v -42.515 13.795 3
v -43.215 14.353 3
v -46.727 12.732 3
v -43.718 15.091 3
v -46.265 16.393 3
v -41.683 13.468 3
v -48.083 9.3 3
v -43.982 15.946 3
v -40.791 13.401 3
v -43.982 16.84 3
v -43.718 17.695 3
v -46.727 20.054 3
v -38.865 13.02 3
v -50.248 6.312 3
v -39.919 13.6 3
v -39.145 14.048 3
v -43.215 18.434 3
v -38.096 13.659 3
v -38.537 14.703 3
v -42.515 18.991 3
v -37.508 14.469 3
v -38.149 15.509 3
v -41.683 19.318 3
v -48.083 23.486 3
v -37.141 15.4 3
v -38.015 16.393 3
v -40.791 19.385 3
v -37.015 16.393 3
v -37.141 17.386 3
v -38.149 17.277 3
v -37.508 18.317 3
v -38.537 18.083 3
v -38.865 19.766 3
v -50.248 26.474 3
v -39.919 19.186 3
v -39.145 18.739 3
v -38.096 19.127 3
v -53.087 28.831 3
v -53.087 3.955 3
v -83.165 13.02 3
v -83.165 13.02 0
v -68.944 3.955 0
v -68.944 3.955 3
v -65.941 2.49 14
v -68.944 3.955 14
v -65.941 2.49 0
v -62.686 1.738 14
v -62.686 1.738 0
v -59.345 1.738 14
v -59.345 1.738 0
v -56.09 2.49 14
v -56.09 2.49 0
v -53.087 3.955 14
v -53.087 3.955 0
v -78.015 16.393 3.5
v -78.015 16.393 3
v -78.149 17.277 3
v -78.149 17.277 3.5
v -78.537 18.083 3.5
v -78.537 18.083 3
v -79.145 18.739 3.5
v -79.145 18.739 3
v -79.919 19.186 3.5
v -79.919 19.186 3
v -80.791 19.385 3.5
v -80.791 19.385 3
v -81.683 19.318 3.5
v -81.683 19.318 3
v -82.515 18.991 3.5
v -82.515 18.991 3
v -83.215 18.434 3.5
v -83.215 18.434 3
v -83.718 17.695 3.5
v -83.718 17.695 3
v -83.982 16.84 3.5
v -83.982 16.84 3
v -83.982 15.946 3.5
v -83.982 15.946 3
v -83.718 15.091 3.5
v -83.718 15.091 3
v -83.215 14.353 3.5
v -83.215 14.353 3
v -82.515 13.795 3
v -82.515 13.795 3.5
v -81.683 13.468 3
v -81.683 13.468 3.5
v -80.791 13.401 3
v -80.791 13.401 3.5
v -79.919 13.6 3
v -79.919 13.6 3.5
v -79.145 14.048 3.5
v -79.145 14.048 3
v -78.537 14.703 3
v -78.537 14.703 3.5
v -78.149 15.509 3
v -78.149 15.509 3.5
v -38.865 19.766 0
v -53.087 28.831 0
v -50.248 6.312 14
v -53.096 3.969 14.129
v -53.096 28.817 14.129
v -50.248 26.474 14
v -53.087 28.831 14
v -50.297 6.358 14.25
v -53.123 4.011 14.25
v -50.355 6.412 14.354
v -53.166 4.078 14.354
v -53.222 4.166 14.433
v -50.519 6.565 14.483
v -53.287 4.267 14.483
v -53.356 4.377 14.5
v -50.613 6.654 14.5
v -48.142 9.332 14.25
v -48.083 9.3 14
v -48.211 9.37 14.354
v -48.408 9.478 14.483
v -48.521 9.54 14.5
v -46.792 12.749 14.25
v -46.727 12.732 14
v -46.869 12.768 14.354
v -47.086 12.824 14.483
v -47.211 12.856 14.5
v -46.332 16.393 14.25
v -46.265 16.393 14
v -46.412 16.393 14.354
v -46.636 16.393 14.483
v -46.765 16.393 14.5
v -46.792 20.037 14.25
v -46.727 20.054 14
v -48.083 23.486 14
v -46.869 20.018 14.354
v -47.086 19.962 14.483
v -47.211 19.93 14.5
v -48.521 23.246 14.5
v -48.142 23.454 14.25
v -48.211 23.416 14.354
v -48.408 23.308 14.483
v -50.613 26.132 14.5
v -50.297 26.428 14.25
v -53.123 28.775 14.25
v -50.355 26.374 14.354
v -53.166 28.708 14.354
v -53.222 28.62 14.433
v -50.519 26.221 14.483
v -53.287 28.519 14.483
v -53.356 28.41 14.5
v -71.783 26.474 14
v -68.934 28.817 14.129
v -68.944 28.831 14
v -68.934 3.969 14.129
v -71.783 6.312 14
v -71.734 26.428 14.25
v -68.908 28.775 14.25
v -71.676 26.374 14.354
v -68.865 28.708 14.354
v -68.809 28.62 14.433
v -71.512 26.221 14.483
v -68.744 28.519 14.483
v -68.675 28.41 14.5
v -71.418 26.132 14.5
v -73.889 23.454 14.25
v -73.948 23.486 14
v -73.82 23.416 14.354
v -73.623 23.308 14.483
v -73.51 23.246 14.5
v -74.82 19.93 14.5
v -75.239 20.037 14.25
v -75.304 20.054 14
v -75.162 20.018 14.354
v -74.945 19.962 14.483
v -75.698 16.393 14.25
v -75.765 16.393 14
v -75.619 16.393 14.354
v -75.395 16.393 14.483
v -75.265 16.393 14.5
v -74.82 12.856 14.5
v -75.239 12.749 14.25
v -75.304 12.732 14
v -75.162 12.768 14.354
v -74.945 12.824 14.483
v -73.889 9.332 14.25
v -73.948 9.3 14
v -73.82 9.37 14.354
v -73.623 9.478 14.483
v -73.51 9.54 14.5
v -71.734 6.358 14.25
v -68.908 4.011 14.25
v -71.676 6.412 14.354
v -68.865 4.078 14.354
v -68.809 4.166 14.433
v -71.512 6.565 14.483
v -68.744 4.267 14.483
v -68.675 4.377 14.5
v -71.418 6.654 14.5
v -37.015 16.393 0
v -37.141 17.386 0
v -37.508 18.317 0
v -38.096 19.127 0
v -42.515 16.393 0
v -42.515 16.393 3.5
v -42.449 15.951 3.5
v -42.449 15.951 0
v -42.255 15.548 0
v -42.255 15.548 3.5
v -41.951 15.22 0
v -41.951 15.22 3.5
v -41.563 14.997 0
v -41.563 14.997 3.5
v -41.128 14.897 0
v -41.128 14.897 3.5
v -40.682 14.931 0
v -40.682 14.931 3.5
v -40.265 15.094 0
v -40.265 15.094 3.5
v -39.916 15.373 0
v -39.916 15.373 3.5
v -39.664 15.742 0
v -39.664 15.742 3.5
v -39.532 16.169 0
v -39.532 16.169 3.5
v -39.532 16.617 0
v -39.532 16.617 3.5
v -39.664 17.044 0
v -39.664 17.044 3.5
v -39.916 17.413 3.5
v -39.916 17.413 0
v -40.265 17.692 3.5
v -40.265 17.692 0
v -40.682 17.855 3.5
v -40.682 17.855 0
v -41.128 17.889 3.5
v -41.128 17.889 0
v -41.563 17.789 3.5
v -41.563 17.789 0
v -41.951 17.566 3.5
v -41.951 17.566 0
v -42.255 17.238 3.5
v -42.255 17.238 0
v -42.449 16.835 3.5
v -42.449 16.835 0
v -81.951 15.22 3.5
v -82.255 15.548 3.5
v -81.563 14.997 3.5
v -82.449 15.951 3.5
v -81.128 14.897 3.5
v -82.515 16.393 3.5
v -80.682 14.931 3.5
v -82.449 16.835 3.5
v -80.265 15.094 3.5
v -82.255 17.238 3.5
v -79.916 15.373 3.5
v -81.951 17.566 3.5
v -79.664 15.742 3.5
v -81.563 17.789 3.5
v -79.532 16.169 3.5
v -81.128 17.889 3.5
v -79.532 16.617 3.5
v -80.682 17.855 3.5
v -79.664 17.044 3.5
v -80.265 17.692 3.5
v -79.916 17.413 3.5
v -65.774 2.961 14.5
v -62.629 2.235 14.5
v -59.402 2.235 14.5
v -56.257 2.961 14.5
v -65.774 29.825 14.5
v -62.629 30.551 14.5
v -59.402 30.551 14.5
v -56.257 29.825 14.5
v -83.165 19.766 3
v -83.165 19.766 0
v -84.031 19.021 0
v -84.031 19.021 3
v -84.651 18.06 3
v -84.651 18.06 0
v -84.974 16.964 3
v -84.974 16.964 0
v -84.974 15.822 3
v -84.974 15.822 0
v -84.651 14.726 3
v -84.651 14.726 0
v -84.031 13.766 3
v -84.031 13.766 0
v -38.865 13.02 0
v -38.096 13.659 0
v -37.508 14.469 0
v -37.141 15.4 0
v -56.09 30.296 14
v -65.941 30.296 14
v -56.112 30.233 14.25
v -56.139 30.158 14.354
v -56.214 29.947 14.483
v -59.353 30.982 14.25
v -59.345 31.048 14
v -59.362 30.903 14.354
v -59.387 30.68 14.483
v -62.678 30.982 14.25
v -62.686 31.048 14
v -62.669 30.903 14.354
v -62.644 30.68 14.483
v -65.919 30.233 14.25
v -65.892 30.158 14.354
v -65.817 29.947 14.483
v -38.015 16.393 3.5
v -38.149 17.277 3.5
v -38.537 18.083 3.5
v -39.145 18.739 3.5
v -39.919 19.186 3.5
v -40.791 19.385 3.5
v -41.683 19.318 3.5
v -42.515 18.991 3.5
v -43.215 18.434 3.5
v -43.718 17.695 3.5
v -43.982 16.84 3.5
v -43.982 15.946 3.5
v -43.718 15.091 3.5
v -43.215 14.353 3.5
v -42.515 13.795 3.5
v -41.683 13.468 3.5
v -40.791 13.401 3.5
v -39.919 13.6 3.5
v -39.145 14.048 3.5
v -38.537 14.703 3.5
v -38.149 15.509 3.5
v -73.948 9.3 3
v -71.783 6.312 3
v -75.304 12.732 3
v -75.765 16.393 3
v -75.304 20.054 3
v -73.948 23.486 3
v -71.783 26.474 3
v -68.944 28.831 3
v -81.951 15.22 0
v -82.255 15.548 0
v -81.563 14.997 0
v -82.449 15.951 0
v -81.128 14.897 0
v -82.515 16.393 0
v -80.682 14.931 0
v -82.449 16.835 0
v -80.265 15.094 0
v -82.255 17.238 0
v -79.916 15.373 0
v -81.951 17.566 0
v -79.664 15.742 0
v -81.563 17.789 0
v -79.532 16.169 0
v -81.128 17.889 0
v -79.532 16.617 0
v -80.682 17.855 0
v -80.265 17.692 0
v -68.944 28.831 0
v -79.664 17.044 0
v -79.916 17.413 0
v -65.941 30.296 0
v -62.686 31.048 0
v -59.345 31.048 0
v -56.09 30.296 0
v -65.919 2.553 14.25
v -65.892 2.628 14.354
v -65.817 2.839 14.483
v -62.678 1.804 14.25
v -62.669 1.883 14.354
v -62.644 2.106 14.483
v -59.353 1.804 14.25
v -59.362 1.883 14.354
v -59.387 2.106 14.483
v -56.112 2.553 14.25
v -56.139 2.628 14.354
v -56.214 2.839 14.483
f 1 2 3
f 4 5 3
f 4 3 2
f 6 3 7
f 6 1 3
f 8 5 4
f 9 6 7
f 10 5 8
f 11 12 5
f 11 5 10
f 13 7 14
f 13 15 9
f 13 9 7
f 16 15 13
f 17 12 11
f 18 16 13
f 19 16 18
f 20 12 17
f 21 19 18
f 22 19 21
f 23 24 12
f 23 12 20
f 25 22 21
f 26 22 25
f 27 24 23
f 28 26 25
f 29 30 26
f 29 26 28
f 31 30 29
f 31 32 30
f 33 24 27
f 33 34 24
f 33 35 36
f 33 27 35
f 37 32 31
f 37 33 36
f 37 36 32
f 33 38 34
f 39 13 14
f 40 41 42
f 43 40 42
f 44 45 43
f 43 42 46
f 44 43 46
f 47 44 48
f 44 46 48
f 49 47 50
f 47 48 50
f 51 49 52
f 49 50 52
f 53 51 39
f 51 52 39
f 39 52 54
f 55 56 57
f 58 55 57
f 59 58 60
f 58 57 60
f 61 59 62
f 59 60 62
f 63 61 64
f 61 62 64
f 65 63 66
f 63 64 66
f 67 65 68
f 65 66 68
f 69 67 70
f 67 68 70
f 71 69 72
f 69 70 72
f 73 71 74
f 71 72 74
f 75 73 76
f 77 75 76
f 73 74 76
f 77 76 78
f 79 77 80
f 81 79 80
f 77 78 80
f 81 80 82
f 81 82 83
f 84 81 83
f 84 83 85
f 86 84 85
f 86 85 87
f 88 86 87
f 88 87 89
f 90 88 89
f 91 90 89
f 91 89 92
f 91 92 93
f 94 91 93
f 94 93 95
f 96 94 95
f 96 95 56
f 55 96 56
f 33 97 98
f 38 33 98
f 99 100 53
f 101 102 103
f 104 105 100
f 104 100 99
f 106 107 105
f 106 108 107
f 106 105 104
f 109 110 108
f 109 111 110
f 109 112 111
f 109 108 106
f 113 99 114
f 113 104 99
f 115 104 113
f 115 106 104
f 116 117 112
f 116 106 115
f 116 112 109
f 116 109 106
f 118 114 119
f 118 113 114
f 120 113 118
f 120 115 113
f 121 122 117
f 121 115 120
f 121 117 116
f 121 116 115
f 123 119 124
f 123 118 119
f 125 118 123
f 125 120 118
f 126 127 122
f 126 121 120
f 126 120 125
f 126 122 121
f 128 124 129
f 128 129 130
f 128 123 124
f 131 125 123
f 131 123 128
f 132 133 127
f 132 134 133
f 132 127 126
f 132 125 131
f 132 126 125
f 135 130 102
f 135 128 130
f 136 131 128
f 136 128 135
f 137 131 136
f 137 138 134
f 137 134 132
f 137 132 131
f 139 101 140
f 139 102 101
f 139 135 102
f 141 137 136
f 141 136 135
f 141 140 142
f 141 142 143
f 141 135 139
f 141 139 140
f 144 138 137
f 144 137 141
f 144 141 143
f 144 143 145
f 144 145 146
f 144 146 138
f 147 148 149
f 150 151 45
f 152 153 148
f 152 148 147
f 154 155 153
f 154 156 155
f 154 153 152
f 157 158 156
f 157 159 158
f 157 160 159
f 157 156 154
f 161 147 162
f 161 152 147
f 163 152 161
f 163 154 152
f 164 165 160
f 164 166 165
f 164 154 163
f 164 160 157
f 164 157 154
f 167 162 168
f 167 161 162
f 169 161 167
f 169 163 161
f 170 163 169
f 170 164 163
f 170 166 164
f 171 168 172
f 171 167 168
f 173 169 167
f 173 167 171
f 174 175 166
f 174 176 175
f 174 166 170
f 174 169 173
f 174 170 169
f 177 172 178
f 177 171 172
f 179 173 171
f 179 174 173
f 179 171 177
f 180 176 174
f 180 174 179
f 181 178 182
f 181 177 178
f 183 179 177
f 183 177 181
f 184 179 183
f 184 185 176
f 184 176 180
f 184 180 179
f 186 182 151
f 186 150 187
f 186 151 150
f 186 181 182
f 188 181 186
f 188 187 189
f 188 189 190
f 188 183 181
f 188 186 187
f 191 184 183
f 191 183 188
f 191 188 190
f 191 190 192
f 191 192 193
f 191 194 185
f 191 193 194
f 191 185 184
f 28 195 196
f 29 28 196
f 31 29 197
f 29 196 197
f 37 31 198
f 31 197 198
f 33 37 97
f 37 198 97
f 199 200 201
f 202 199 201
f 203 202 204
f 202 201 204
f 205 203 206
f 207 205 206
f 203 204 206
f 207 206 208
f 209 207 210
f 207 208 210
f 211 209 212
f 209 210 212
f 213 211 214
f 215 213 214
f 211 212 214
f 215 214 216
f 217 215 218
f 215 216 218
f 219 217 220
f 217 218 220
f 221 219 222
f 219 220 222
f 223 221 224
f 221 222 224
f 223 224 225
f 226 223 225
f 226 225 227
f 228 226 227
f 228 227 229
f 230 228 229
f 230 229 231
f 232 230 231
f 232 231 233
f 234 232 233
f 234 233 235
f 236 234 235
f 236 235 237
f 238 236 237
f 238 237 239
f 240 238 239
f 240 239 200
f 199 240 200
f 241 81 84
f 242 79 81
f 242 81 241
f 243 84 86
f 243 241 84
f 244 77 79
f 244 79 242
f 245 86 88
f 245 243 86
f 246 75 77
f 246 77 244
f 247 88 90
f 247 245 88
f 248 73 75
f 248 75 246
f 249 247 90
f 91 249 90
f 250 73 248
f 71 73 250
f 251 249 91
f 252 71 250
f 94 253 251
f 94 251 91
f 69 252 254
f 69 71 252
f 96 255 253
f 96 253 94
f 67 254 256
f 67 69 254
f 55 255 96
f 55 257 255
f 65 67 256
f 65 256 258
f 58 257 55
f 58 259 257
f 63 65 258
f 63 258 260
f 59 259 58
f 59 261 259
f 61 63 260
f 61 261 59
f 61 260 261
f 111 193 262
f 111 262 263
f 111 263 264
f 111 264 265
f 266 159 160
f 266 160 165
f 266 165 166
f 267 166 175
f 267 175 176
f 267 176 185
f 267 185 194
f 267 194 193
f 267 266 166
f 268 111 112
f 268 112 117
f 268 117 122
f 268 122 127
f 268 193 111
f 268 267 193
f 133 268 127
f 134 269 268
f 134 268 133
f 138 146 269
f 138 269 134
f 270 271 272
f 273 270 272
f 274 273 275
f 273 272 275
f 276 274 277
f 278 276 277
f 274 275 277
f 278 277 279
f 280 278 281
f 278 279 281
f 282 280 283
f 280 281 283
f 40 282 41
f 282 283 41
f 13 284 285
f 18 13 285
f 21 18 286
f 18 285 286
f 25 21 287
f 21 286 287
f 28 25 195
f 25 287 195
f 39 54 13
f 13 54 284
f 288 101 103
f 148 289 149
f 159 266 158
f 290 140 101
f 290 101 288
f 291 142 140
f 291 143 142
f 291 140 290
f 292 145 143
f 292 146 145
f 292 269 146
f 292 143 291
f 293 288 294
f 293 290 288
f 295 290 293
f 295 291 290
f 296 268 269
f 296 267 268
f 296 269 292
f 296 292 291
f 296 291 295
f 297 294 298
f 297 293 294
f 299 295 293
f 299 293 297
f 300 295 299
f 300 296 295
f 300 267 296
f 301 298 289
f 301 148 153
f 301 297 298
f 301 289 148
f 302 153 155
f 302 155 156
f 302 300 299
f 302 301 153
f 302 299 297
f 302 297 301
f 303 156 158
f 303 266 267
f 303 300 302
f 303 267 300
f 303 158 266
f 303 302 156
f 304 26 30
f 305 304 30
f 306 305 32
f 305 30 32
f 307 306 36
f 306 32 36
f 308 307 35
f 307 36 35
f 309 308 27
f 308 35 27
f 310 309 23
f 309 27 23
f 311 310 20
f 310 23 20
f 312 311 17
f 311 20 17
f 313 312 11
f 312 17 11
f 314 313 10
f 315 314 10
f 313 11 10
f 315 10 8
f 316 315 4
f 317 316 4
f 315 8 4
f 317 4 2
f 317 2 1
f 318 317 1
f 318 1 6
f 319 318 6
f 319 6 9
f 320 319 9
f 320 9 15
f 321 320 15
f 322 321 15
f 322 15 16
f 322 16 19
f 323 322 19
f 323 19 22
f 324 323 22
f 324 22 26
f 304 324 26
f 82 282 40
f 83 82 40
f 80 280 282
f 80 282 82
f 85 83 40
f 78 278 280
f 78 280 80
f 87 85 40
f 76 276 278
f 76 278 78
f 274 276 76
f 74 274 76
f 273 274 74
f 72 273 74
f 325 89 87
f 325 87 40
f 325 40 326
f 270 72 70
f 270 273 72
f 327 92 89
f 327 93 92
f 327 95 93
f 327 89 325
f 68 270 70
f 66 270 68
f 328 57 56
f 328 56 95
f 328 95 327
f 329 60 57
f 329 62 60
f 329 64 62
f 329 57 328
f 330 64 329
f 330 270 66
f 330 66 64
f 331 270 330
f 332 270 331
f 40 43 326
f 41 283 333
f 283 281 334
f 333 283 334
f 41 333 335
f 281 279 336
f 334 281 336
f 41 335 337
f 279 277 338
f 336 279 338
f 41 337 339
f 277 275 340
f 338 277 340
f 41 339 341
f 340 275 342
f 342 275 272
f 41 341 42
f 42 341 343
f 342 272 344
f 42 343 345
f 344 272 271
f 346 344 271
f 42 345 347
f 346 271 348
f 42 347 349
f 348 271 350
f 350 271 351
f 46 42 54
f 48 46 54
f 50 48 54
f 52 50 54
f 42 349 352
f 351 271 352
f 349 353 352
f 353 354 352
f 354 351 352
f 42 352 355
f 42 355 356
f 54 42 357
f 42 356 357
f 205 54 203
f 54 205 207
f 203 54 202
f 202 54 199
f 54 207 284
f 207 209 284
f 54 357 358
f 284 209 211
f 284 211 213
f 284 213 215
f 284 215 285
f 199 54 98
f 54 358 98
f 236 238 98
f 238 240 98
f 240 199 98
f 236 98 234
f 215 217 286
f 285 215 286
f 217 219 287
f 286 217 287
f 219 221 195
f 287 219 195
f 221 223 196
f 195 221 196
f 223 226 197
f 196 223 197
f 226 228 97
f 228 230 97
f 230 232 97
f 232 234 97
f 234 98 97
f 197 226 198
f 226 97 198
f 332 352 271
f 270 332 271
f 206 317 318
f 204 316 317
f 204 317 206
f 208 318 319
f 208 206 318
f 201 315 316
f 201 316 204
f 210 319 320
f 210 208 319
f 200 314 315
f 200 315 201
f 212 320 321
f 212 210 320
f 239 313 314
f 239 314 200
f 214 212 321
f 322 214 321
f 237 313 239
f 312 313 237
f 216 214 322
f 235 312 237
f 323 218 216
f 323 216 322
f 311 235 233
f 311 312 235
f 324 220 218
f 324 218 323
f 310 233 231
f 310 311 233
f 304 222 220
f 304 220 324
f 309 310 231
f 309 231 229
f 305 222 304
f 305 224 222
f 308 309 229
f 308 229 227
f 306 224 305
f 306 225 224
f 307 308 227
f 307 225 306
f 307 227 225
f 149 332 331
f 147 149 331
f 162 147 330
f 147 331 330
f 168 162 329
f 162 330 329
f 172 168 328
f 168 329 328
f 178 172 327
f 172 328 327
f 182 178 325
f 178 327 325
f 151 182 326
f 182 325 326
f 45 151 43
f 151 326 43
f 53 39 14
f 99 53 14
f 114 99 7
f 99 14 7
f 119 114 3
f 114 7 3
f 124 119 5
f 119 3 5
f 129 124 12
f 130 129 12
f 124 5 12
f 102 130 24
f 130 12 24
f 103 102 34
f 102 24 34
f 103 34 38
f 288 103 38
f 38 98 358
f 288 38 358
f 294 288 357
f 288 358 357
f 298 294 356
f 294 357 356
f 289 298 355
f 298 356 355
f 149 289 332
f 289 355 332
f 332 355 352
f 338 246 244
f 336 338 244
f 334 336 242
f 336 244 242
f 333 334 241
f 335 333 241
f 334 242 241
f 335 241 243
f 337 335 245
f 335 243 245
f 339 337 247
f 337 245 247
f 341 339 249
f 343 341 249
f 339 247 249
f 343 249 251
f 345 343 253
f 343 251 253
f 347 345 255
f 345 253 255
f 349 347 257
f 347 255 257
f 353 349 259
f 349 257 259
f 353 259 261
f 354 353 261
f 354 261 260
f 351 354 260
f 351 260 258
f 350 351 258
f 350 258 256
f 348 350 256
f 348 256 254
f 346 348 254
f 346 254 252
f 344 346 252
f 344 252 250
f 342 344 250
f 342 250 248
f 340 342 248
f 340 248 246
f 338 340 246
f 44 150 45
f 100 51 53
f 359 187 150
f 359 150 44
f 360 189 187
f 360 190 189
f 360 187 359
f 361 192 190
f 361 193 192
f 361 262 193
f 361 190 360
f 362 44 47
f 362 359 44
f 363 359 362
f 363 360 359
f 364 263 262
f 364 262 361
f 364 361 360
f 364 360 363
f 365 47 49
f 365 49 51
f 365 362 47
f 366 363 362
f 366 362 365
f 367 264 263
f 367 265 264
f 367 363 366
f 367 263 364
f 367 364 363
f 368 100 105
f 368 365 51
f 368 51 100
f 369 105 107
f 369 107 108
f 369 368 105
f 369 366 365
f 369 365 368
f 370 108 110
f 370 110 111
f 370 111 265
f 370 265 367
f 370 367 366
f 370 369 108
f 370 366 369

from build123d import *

# Parameters (mm, degrees)
F0_R     = 3
F1_DEPTH = 3
F3_DEPTH = 11.5
F4_R     = 0.5
F6_DEPTH = 3.5
F7_D     = 3


with BuildPart() as f1:
    # F0 (on Top) → F1 (new body)
    with BuildSketch(Plane.XY):
        with BuildLine():
            ThreePointArc((-53.0873338103, 3.9548860426), (-48.0828963467, 9.2999784643), (-46.2654588103, 16.393026337))
            ThreePointArc((-46.2654588103, 16.393026337), (-48.0828963467, 23.4860742098), (-53.0873338103, 28.8311666315))
            ThreePointArc((-53.0873338103, 28.8311666315), (-61.0154588103, 31.143026337), (-68.9435838103, 28.8311666315))
            ThreePointArc((-68.9435838103, 28.8311666315), (-75.7654588103, 16.393026337), (-68.9435838103, 3.9548860426))
            ThreePointArc((-68.9435838103, 3.9548860426), (-61.0154588103, 1.643026337), (-53.0873338103, 3.9548860426))
        make_face()
        with BuildLine():
            ThreePointArc((-68.9435838103, 3.9548860426), (-75.7654588103, 16.393026337), (-68.9435838103, 28.8311666315))
            Line((-68.9435838103, 28.8311666315), (-83.1654588103, 19.7660813321))
            ThreePointArc((-83.1654588103, 19.7660813321), (-79.0919204042, 19.9001619204), (-77.0154588103, 16.393026337))
            ThreePointArc((-77.0154588103, 16.393026337), (-79.0919204042, 12.8858907537), (-83.1654588103, 13.0199713419))
            Line((-83.1654588103, 13.0199713419), (-68.9435838103, 3.9548860426))
        make_face()
        with BuildLine():
            ThreePointArc((-53.0873338103, 28.8311666315), (-48.0828963467, 23.4860742098), (-46.2654588103, 16.393026337))
            ThreePointArc((-46.2654588103, 16.393026337), (-48.0828963467, 9.2999784643), (-53.0873338103, 3.9548860426))
            Line((-53.0873338103, 3.9548860426), (-38.8654588103, 13.0199713419))
            ThreePointArc((-38.8654588103, 13.0199713419), (-45.0154588103, 16.393026337), (-38.8654588103, 19.7660813321))
            Line((-38.8654588103, 19.7660813321), (-53.0873338103, 28.8311666315))
        make_face()
        with BuildLine():
            ThreePointArc((-37.0154588103, 16.393026337), (-37.508323227, 18.3165647432), (-38.8654588103, 19.7660813321))
            ThreePointArc((-38.8654588103, 19.7660813321), (-45.0154588103, 16.393026337), (-38.8654588103, 13.0199713419))
            ThreePointArc((-38.8654588103, 13.0199713419), (-37.508323227, 14.4694879309), (-37.0154588103, 16.393026337))
        make_face()
        with Locations((-41.0154588103, 16.393026337)):
            Circle(F0_R, mode=Mode.SUBTRACT)
        with BuildLine():
            ThreePointArc((-77.0154588103, 16.393026337), (-79.0919204042, 19.9001619204), (-83.1654588103, 19.7660813321))
            ThreePointArc((-83.1654588103, 19.7660813321), (-85.0154588103, 16.393026337), (-83.1654588103, 13.0199713419))
            ThreePointArc((-83.1654588103, 13.0199713419), (-79.0919204042, 12.8858907537), (-77.0154588103, 16.393026337))
        make_face()
        with Locations((-81.0154588103, 16.393026337)):
            Circle(F0_R, mode=Mode.SUBTRACT)
    extrude(amount=F1_DEPTH)

    # F2 (on face) → F3 (join)
    with BuildSketch(Plane.XY.offset(3)):
        with BuildLine():
            ThreePointArc((-53.0873338103, 3.9548860426), (-48.0828963467, 9.2999784643), (-46.2654588103, 16.393026337))
            ThreePointArc((-46.2654588103, 16.393026337), (-48.0828963467, 23.4860742098), (-53.0873338103, 28.8311666315))
            ThreePointArc((-53.0873338103, 28.8311666315), (-61.0154588103, 31.143026337), (-68.9435838103, 28.8311666315))
            ThreePointArc((-68.9435838103, 28.8311666315), (-75.7654588103, 16.393026337), (-68.9435838103, 3.9548860426))
            ThreePointArc((-68.9435838103, 3.9548860426), (-61.0154588103, 1.643026337), (-53.0873338103, 3.9548860426))
        make_face()
    extrude(amount=F3_DEPTH)

    # F4
    f4_edges = [f1.edges().sort_by_distance(p)[0] for p in [
        (-53.087334, 28.831167, 14.5),
    ]]
    fillet(f4_edges, radius=F4_R)

    # F0 (on Top) → F6 (join)
    with BuildSketch(Plane.XY):
        with Locations((-41.0154588103, 16.393026337)):
            Circle(F0_R)
        with Locations((-81.0154588103, 16.393026337)):
            Circle(F0_R)
    extrude(amount=F6_DEPTH)

    # F7 (through all)
    with Locations(Plane(origin=(0, 0, 0), x_dir=(1, 0, 0), z_dir=(0, 0, -1))):
        with Locations((-81.0154588103, -16.393026337), (-41.0154588103, -16.393026337)):
            Hole(F7_D / 2)


solid = f1.part
